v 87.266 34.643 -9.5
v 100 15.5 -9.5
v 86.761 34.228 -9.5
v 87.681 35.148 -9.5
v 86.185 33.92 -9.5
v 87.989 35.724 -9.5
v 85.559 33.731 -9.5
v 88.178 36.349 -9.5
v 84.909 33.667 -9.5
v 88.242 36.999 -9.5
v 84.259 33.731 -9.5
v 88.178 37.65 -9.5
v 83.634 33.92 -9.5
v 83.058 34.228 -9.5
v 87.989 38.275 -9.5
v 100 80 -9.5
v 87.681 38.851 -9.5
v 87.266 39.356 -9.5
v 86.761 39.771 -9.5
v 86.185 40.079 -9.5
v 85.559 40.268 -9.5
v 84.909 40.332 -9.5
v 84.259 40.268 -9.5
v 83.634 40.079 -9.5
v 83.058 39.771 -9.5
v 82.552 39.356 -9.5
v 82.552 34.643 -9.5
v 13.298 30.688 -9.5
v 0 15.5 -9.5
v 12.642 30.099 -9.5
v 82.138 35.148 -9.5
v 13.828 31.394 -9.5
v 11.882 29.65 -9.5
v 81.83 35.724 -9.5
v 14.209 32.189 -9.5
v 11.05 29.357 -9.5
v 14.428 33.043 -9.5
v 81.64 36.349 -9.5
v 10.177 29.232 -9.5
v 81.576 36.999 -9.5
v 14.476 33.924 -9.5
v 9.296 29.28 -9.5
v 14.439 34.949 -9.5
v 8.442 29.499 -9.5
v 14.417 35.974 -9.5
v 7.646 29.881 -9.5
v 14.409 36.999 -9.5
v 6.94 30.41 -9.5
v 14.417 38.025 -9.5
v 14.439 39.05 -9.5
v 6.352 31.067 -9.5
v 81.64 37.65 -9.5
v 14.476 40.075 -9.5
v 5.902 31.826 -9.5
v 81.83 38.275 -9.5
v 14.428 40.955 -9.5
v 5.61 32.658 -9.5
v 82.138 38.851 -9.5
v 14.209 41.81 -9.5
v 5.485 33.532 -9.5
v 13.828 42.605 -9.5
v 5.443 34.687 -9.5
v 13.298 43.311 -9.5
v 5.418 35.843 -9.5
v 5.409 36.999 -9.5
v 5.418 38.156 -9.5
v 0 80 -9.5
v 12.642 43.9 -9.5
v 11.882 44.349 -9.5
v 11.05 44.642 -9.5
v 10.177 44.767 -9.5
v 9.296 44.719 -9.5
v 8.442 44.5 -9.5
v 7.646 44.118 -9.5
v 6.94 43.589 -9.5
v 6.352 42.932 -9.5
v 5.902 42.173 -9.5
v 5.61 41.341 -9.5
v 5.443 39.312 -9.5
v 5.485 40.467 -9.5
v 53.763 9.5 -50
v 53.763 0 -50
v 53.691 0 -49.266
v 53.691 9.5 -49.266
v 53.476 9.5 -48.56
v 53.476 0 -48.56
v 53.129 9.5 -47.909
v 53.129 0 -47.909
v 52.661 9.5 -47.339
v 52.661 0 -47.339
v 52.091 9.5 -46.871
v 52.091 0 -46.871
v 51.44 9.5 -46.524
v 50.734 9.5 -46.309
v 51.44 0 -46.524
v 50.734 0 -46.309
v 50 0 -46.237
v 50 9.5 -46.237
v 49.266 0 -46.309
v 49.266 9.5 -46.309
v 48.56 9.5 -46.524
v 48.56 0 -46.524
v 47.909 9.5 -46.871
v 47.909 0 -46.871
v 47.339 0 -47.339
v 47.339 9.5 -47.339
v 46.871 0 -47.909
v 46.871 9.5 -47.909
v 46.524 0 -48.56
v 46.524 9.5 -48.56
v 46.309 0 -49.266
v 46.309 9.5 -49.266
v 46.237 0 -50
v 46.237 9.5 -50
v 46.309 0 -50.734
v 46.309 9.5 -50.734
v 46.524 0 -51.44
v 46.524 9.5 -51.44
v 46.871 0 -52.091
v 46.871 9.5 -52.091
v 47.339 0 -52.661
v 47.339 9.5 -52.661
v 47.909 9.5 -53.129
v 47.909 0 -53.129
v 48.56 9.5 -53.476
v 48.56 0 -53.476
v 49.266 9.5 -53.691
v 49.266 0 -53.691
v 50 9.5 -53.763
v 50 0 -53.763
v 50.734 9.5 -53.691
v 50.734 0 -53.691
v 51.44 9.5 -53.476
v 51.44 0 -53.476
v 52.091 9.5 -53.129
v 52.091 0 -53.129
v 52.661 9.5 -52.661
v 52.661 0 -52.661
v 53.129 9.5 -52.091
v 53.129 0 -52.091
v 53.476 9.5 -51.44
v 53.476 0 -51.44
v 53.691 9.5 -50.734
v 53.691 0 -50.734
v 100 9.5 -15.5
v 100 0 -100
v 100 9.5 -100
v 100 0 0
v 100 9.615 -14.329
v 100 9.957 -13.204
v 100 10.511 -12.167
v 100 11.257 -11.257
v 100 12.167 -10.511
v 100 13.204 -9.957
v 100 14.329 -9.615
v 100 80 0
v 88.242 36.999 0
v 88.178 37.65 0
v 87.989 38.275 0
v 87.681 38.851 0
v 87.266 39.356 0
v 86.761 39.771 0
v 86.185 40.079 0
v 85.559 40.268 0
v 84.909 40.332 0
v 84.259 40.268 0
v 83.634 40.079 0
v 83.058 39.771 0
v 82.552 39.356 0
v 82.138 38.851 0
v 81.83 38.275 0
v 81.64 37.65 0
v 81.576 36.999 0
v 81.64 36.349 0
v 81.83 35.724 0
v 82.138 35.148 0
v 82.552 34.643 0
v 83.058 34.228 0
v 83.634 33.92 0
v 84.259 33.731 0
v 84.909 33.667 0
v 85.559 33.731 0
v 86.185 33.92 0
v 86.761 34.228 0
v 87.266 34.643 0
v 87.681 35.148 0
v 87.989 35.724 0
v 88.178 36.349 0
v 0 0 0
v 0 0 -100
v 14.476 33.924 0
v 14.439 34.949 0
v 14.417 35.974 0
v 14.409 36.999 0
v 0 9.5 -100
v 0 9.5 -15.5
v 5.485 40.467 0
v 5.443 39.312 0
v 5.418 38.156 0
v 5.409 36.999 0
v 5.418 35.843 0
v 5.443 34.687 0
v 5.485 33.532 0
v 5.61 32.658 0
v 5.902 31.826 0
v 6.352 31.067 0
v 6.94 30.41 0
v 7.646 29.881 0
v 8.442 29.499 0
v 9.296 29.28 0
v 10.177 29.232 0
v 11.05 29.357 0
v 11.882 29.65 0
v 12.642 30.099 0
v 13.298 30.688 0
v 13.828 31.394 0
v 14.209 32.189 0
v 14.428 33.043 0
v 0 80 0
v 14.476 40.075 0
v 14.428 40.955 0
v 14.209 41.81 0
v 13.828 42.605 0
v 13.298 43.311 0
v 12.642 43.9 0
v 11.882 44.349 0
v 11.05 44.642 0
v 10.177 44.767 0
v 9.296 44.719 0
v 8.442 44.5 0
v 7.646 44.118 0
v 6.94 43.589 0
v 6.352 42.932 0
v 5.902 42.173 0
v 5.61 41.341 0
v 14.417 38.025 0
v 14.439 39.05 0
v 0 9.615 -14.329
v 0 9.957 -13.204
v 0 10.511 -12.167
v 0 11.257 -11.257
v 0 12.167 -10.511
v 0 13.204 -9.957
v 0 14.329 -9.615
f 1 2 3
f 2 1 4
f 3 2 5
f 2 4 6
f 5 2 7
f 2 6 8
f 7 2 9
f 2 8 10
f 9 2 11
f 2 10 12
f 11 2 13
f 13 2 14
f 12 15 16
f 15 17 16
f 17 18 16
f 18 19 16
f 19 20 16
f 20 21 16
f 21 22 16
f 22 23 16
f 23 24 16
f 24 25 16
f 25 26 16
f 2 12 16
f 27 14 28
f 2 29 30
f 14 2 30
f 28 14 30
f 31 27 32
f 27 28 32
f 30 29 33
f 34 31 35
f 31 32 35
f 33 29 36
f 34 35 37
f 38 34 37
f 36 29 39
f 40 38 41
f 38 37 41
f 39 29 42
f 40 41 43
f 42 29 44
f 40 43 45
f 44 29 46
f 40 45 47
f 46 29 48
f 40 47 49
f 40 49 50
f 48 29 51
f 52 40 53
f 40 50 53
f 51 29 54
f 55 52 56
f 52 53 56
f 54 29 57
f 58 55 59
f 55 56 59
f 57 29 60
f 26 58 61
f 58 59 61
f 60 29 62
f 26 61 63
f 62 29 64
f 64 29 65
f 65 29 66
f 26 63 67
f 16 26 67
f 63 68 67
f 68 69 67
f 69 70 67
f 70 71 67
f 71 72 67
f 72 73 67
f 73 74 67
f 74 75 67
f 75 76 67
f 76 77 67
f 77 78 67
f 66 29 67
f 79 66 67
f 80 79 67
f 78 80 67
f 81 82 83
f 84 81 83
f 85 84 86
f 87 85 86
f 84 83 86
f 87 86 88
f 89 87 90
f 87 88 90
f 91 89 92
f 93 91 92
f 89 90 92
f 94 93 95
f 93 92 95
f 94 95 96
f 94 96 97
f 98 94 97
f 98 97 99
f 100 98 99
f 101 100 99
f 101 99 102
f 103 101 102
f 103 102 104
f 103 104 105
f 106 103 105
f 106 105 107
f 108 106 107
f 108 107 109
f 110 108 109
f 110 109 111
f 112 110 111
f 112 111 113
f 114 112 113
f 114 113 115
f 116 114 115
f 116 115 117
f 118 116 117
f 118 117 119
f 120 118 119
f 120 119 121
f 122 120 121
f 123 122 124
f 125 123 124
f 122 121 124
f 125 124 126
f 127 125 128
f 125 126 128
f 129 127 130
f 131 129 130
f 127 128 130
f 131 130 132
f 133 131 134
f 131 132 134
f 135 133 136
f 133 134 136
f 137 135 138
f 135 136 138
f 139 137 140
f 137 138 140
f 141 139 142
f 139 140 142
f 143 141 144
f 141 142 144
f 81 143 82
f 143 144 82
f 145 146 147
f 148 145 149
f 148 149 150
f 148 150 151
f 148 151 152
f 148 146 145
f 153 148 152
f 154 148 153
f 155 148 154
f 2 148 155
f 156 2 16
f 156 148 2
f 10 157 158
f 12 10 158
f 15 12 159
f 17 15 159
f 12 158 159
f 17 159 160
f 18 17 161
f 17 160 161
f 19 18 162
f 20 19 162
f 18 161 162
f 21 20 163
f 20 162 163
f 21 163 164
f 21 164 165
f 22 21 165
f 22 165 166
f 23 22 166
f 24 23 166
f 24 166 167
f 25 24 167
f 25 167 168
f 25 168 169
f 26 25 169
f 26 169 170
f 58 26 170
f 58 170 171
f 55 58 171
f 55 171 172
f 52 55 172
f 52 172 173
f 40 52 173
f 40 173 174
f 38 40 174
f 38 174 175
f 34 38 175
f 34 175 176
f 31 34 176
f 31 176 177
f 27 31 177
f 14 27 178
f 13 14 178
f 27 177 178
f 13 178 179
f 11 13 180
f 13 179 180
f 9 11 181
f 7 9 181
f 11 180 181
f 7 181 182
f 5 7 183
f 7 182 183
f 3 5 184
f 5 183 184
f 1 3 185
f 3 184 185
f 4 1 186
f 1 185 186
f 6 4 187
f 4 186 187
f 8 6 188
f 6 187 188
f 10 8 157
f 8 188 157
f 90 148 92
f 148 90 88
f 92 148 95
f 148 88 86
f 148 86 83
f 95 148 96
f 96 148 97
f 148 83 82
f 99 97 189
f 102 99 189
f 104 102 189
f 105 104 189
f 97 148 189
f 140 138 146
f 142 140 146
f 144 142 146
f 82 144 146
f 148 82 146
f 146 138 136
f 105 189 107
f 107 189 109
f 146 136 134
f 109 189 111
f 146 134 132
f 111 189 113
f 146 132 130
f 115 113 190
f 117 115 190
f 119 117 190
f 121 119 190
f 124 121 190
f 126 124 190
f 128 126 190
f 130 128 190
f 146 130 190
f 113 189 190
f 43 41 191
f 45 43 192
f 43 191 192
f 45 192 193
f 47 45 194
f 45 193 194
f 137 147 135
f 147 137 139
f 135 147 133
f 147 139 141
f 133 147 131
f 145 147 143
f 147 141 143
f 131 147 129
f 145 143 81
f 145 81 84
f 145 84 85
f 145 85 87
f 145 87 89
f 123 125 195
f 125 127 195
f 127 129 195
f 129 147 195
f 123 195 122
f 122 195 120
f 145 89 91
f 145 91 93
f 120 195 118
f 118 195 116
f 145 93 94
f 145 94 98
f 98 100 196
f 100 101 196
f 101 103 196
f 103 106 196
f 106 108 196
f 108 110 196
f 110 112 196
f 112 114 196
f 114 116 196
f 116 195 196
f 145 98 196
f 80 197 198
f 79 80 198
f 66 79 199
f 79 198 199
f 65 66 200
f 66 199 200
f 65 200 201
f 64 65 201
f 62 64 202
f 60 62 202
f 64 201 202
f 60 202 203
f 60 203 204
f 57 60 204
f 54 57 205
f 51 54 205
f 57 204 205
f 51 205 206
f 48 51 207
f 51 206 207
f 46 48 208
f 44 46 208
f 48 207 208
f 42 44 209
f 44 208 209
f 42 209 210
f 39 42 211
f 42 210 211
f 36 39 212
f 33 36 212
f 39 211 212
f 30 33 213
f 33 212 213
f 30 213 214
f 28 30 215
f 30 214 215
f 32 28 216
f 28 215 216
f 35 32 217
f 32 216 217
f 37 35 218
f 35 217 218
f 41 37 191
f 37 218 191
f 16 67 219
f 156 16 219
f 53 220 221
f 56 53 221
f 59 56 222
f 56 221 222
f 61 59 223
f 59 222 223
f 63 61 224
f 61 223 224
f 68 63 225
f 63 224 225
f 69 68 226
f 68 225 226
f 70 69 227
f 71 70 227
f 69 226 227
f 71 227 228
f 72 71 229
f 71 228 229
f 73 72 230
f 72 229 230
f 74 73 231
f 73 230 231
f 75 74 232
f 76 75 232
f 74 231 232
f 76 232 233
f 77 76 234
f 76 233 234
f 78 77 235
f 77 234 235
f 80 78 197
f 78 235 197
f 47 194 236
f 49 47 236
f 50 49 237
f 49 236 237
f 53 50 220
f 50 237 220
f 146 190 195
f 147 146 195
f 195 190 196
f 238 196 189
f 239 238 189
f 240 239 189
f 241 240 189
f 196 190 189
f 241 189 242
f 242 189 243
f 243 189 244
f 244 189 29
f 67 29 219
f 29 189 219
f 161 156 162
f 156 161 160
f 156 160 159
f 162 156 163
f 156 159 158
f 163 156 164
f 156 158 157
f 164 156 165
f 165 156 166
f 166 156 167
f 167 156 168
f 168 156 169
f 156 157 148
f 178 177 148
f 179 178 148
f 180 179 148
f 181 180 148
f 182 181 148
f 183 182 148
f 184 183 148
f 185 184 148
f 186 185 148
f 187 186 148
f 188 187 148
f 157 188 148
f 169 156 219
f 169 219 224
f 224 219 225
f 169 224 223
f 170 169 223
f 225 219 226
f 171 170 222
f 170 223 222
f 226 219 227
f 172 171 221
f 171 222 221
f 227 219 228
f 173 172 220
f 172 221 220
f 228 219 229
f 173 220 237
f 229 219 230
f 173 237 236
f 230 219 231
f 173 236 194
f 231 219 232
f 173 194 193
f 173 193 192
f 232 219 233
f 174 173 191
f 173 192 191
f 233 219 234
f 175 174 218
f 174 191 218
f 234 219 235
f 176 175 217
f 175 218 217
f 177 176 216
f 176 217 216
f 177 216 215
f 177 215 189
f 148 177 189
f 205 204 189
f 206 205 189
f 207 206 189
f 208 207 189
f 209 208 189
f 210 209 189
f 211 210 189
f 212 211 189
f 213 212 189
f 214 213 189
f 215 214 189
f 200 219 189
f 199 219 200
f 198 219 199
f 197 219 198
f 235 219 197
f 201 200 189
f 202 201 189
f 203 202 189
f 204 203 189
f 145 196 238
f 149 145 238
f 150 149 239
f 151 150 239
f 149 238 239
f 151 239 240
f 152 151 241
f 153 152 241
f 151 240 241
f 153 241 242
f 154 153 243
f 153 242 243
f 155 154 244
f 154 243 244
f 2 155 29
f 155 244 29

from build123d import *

# Parameters (mm, degrees)
F1_DEPTH = 100
F2_R     = 3.332982
F3_DEPTH = 25
F4_R     = 3.762858
F5_DEPTH = 25


with BuildPart() as f1:
    # F0 (on Right) → F1 (new body)
    with BuildSketch(Plane.YZ):
        with BuildLine():
            Line((80, 0), (0, 0))
            Line((0, 0), (0, -100))
            Line((0, -100), (9.5, -100))
            Line((9.5, -100), (9.5, -15.5))
            ThreePointArc((9.5, -15.5), (11.257359, -11.257359), (15.5, -9.5))
            Line((15.5, -9.5), (80, -9.5))
            Line((80, -9.5), (80, 0))
        make_face()
    extrude(amount=F1_DEPTH)

    # F2 (on face) → F3 (cut)
    with BuildSketch(Plane.XY):
        with Locations((84.909265, 36.999489)):
            Circle(F2_R)
        with BuildLine():
            ThreePointArc((5.484932, 33.531748), (10.176936, 29.232318), (14.476366, 33.924322))
            ThreePointArc((14.476366, 33.924322), (14.426042, 35.46154), (14.409265, 36.999489))
            ThreePointArc((14.409265, 36.999489), (14.426042, 38.537438), (14.476366, 40.074656))
            ThreePointArc((14.476366, 40.074656), (10.176936, 44.76666), (5.484932, 40.46723))
            ThreePointArc((5.484932, 40.46723), (5.428184, 38.733772), (5.409265, 36.999489))
            ThreePointArc((5.409265, 36.999489), (5.428184, 35.265206), (5.484932, 33.531748))
        make_face()
    extrude(amount=-F3_DEPTH, mode=Mode.SUBTRACT)

    # F4 (on face) → F5 (cut)
    with BuildSketch(Plane.XZ):
        with Locations((50, -50)):
            Circle(F4_R)
    extrude(amount=-F5_DEPTH, mode=Mode.SUBTRACT)


solid = f1.part
